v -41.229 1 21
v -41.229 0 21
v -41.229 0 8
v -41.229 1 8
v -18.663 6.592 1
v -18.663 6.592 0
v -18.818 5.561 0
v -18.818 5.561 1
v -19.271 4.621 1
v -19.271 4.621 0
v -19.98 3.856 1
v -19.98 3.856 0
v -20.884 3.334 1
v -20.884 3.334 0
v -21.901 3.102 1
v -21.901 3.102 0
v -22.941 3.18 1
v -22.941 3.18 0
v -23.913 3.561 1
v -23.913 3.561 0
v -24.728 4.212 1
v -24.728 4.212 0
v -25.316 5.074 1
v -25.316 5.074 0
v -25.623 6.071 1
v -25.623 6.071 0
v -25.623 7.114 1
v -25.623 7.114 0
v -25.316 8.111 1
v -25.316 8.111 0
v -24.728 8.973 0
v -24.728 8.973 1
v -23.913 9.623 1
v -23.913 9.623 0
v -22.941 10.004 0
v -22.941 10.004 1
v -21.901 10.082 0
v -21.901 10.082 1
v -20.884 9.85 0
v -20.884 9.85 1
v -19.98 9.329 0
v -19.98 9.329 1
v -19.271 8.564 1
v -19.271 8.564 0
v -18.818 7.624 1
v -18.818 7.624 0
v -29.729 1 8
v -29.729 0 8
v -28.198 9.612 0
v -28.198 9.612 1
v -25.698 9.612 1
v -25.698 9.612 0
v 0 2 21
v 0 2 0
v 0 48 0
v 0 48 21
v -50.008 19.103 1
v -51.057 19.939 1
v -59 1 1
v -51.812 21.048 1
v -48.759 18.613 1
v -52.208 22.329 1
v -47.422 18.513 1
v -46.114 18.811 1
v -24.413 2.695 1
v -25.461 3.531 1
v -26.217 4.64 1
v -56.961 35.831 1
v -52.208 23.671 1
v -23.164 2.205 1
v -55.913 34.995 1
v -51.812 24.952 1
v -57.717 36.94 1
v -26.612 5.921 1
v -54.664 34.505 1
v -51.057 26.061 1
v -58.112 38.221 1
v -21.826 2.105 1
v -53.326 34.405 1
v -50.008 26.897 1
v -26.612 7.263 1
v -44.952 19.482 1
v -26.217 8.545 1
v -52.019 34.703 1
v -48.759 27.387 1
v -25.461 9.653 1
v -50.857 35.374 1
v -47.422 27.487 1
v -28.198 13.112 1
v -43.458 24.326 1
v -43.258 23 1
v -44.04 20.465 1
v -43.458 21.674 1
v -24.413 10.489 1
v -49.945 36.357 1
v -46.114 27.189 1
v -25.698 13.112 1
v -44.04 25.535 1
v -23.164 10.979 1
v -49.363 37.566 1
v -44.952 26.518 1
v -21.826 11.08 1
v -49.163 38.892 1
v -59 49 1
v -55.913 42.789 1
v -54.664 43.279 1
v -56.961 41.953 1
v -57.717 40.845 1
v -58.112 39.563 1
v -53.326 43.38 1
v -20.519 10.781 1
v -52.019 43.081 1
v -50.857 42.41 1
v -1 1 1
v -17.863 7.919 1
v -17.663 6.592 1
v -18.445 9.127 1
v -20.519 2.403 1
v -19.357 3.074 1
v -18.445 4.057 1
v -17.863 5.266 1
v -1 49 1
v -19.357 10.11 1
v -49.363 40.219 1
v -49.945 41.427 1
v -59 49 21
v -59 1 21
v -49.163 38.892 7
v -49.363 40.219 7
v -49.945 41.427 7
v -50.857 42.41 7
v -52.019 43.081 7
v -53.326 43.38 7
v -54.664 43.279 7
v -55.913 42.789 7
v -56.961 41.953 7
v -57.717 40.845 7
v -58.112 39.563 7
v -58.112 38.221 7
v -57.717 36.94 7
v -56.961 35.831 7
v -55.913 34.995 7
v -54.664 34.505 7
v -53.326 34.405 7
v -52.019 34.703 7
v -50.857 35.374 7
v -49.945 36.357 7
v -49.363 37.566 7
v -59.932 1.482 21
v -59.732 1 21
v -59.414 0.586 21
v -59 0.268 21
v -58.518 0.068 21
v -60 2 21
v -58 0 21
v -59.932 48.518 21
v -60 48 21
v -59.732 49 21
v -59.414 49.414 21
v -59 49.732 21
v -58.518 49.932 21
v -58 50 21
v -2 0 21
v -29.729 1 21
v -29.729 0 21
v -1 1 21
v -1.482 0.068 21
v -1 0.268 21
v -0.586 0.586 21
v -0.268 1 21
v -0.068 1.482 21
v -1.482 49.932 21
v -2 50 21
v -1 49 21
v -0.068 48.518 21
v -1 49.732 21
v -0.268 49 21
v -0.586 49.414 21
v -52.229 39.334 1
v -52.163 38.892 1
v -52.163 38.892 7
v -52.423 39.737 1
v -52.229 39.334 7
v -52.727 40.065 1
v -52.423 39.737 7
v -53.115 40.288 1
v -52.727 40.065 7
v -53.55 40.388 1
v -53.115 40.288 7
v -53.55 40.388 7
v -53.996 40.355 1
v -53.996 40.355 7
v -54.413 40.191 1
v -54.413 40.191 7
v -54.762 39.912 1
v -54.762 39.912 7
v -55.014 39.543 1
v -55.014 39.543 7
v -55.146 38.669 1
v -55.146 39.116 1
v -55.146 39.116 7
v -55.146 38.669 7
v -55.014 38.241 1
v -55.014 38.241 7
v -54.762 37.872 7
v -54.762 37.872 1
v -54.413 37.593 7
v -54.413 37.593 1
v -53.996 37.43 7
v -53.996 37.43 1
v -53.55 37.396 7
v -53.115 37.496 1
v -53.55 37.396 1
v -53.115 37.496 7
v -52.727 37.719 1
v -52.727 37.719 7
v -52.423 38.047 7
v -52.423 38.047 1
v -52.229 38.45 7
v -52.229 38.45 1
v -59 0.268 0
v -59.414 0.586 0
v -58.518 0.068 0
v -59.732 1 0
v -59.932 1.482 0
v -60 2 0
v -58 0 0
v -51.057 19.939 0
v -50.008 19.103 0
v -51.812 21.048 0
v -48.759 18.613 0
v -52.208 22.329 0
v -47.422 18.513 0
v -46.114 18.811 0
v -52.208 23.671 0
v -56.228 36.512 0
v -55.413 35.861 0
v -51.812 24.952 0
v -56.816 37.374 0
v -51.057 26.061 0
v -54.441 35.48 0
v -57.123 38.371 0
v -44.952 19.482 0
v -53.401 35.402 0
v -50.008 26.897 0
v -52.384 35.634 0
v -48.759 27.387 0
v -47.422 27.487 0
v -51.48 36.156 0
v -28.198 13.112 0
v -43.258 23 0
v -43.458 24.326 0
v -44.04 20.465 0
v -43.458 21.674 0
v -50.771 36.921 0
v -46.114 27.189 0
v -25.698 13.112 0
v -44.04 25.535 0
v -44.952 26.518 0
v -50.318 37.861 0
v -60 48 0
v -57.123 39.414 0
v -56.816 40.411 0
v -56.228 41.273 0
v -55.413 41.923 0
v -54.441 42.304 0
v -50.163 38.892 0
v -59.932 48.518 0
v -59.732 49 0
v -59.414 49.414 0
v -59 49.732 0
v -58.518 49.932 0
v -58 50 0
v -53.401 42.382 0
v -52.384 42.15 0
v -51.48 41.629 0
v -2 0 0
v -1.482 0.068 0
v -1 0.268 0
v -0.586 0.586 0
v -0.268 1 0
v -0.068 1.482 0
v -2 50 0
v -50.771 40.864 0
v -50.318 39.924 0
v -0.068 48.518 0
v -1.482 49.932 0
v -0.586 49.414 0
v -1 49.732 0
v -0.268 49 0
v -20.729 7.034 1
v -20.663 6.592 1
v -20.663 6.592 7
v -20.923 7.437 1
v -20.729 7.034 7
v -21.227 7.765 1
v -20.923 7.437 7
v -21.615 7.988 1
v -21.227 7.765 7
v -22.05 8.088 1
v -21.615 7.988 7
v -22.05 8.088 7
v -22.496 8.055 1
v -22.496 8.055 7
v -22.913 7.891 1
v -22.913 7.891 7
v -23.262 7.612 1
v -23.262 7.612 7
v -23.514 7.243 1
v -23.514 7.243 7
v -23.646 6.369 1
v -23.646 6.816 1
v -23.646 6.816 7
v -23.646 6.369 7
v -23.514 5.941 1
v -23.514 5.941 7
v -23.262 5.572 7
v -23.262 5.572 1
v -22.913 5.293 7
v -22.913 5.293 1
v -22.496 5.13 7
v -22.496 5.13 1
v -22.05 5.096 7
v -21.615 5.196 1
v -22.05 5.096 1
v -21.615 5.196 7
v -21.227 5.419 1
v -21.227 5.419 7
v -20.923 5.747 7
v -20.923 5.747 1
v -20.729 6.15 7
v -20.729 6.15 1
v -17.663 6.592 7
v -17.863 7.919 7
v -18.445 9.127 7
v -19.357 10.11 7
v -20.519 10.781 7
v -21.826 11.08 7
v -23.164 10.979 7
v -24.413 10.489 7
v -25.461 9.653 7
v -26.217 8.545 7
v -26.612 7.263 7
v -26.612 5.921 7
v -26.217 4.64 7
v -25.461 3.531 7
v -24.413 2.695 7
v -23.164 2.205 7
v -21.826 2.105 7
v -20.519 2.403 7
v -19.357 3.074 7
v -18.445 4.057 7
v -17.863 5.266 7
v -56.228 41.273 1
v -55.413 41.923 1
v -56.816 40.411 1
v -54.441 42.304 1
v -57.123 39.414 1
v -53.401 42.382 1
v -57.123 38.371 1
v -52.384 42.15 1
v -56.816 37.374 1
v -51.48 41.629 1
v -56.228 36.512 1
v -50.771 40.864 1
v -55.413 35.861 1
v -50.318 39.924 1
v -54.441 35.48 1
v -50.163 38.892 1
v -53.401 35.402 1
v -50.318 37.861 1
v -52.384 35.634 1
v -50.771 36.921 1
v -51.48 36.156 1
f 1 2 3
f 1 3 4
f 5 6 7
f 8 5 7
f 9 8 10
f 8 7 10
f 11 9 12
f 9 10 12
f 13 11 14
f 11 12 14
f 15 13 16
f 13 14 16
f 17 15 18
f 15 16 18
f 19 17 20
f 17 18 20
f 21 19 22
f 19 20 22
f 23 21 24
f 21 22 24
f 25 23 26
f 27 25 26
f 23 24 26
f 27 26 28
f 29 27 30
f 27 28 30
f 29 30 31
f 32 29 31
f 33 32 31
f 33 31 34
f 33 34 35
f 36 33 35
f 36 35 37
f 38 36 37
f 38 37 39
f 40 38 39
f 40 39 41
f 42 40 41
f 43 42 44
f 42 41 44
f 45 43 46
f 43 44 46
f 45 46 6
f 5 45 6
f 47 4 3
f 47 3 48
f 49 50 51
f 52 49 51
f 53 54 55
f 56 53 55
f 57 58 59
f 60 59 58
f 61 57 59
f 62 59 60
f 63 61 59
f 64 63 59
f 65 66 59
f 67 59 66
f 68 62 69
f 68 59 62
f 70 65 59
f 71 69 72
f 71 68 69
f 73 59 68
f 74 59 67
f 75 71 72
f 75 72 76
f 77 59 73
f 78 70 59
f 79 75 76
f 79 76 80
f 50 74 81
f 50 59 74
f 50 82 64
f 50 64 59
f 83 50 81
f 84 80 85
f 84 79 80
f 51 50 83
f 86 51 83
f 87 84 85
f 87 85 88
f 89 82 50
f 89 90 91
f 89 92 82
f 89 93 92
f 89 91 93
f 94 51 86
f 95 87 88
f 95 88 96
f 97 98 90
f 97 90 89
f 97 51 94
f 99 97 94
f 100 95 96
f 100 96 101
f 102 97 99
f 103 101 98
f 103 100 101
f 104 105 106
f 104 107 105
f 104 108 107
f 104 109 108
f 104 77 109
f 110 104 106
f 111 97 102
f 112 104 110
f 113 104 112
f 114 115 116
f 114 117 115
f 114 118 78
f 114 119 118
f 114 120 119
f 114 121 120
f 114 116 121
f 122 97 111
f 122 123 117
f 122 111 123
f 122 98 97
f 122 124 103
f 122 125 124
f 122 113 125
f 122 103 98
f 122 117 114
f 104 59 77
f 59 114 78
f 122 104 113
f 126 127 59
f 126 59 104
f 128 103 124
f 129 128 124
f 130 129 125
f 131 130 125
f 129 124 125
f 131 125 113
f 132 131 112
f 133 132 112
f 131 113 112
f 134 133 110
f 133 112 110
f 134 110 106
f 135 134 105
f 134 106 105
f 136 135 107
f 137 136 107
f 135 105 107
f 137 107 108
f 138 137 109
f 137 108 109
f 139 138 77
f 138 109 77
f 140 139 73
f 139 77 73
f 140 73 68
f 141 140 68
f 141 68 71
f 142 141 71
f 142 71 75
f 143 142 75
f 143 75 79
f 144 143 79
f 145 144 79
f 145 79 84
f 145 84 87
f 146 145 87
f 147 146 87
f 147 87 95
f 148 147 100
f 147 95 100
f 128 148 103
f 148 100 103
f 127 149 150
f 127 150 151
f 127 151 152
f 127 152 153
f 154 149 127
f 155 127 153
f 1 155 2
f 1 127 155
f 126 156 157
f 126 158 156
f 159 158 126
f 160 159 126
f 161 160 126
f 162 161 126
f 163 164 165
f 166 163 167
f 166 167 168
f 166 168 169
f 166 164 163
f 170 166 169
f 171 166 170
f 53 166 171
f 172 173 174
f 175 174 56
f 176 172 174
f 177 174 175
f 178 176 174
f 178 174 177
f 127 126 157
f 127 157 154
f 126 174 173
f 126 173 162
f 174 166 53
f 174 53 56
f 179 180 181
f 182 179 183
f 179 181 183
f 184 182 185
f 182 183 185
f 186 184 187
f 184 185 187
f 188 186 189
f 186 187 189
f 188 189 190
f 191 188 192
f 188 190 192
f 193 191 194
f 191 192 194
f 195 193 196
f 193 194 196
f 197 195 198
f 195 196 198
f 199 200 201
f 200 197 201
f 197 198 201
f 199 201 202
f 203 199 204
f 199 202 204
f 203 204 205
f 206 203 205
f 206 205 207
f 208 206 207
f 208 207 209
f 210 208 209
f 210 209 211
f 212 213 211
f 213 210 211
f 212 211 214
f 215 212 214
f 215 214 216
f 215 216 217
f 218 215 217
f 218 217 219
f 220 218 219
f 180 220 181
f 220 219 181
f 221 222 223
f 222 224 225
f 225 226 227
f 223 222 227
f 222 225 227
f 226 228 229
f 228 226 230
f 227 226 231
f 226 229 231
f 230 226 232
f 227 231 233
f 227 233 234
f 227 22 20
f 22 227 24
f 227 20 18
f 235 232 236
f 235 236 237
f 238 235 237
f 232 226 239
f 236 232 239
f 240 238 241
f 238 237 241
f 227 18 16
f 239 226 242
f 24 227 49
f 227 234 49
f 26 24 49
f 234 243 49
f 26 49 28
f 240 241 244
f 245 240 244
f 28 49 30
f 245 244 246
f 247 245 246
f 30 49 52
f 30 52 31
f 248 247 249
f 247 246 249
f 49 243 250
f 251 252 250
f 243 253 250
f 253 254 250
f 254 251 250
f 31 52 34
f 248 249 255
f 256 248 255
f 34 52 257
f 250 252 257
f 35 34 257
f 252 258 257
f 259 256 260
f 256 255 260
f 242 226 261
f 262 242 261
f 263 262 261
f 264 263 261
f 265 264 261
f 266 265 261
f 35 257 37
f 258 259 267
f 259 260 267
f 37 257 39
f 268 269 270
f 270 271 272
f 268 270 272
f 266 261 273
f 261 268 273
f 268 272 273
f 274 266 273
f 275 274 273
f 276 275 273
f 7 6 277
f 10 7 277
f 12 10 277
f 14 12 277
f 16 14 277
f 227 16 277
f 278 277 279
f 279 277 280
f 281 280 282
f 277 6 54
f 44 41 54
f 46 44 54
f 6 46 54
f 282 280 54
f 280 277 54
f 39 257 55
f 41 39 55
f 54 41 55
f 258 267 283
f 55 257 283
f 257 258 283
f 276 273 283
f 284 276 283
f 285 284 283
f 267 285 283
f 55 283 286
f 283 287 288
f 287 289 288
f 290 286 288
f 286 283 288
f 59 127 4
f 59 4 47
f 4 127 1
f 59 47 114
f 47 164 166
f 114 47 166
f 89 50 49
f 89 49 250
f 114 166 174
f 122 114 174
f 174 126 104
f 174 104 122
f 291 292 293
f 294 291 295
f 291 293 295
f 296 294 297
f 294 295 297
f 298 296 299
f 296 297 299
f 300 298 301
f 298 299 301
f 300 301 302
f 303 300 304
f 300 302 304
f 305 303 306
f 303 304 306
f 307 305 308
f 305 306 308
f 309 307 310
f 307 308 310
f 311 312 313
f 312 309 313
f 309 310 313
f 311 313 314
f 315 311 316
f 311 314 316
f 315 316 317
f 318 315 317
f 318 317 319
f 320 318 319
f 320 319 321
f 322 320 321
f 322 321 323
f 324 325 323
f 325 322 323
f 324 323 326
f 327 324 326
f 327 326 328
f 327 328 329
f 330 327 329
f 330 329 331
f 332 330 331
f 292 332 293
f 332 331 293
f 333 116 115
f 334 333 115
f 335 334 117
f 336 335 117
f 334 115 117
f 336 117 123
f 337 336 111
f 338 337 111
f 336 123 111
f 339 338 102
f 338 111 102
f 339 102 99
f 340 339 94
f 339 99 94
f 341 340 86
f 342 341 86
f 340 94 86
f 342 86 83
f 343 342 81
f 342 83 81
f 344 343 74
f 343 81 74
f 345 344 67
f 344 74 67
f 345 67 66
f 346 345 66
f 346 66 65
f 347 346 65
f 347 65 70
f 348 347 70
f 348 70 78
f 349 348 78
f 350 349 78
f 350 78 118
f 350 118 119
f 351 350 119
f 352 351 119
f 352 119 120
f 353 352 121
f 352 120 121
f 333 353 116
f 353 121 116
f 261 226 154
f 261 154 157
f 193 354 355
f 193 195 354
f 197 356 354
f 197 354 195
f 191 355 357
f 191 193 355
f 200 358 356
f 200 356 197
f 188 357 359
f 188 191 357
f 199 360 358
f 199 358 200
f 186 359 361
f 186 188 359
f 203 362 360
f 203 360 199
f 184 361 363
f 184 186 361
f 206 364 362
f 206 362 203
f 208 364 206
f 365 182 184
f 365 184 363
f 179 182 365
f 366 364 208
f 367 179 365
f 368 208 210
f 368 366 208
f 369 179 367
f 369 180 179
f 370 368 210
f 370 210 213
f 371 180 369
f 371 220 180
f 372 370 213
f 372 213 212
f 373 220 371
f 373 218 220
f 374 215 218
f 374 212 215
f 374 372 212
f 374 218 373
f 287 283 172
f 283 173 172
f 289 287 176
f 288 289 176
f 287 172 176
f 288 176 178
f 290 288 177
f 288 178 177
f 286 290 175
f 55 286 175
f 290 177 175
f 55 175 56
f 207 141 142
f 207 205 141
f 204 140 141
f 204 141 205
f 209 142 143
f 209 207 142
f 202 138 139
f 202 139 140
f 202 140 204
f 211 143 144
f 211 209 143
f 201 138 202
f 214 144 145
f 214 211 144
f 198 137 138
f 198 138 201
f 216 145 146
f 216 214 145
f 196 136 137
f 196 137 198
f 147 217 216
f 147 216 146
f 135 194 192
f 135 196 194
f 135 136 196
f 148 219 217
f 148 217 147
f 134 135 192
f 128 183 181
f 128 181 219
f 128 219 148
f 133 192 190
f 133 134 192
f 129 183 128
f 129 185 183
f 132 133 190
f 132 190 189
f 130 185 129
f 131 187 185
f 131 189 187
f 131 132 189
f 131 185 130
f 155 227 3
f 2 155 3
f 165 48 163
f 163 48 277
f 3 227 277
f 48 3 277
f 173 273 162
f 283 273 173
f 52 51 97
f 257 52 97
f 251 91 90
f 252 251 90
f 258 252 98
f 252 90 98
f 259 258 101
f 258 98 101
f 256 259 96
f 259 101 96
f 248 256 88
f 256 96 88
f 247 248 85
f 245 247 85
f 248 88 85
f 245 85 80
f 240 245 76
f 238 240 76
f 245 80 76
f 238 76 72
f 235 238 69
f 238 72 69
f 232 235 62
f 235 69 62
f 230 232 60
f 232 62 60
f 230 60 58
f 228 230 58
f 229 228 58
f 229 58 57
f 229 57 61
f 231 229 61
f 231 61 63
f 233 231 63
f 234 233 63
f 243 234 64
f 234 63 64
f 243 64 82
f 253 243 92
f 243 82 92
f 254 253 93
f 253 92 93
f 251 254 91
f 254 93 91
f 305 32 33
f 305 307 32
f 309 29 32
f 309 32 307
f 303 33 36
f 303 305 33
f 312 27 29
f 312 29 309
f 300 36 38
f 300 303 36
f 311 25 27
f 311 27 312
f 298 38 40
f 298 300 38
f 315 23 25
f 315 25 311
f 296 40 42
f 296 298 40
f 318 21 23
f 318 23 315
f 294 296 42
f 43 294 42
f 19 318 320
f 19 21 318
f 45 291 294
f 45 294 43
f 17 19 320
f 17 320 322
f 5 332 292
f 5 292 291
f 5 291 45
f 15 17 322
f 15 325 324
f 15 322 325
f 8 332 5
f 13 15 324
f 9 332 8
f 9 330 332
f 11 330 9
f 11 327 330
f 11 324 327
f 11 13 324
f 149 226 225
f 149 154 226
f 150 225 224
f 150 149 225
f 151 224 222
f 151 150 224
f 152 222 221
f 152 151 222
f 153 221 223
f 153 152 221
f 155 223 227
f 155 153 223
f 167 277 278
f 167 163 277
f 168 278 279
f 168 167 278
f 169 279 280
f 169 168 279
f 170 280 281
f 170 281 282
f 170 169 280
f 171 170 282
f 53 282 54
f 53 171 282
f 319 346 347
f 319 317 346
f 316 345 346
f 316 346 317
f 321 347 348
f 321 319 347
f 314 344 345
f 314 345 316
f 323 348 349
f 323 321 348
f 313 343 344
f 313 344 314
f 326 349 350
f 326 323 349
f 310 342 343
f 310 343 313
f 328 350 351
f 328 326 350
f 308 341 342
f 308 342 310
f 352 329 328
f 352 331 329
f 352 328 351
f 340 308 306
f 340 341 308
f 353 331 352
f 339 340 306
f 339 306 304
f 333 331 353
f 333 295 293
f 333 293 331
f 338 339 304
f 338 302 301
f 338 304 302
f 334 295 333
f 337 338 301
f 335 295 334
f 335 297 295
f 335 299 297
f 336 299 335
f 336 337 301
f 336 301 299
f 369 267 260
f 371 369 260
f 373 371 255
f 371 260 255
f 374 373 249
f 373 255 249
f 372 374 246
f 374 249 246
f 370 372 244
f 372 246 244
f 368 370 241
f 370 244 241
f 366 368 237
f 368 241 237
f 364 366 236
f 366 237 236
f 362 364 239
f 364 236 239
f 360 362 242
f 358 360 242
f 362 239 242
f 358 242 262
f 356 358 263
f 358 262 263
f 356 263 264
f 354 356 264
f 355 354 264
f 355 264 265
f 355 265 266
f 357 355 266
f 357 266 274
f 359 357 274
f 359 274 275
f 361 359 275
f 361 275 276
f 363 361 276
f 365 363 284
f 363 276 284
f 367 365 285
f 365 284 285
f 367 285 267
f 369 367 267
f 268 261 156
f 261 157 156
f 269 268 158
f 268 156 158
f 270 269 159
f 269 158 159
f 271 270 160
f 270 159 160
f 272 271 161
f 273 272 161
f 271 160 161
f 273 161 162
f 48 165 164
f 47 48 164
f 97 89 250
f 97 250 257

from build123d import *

# Parameters (mm, degrees)
F0_W      = 60
F0_H      = 50
F1_DEPTH  = 21
F2_W      = 58
F2_H      = 48
F3_DEPTH  = 20
F5_R      = 2
F6_R      = 4.5
F7_DEPTH  = 6
F10_W     = 11.5
F10_H     = 1
F11_DEPTH = 13
F12_W     = 2.5
F12_H     = 3.5
F13_DEPTH = 1
F14_R     = 4.5
F15_DEPTH = 1
F8_R      = 1.5
F16_DEPTH = 7
F9_R      = 1.5
F17_DEPTH = 7
F18_R     = 3.5
F18_R_2   = 1.5
F19_DEPTH = 1


with BuildPart() as f1:
    # F0 (on Top) → F1 (new body)
    with BuildSketch(Plane.XY):
        with Locations((-30, 25)):
            Rectangle(F0_W, F0_H)
    extrude(amount=F1_DEPTH)

    # F2 (on face) → F3 (cut)
    with BuildSketch(Plane.XY.offset(21)):
        with Locations((-30, 25)):
            Rectangle(F2_W, F2_H)
    extrude(amount=-F3_DEPTH, mode=Mode.SUBTRACT)

    # F5
    f5_edges = [f1.edges().sort_by_distance(p)[0] for p in [
        (-60, 50, 10.5),
        (0, 50, 10.5),
        (0, 0, 10.5),
        (-60, 0, 10.5),
    ]]
    fillet(f5_edges, radius=F5_R)

    # F6 (on face) → F7 (join)
    with BuildSketch(Plane.XY.offset(1)):
        with Locations((-22.1625890434, 6.5921834528)):
            Circle(F6_R)
        with Locations((-53.6625890434, 38.8921834528)):
            Circle(F6_R)
    extrude(amount=F7_DEPTH)

    # F10 (on face) → F11 (cut)
    with BuildSketch(Plane.XY.offset(21)):
        with Locations((-35.4789009094, 0.5)):
            Rectangle(F10_W, F10_H)
    extrude(amount=-F11_DEPTH, mode=Mode.SUBTRACT)

    # F12 (on face) → F13 (cut)
    with BuildSketch(Plane.XY.offset(1)):
        with Locations((-26.94821703, 11.3616460413)):
            Rectangle(F12_W, F12_H)
    extrude(amount=-F13_DEPTH, mode=Mode.SUBTRACT)

    # F14 (on face) → F15 (cut)
    with BuildSketch(Plane.XY.offset(1)):
        with Locations((-47.7578996122, 23)):
            Circle(F14_R)
    extrude(amount=-F15_DEPTH, mode=Mode.SUBTRACT)

    # F8 (on face) → F16 (cut)
    with BuildSketch(Plane.XY.offset(7)):
        with Locations((-53.6625890434, 38.8921834528)):
            Circle(F8_R)
    extrude(amount=-F16_DEPTH, mode=Mode.SUBTRACT)

    # F9 (on face) → F17 (cut)
    with BuildSketch(Plane.XY.offset(7)):
        with Locations((-22.1625890434, 6.5921834528)):
            Circle(F9_R)
    extrude(amount=-F17_DEPTH, mode=Mode.SUBTRACT)

    # F18 (on face) → F19 (cut)
    with BuildSketch(Plane(origin=(0, 0, 0), x_dir=(1, 0, 0), z_dir=(0, 0, -1))):
        with Locations((-22.1625890434, -6.5921834528)):
            Circle(F18_R)
        with Locations((-22.1625890434, -6.5921834528)):
            Circle(F18_R_2, mode=Mode.SUBTRACT)
        with Locations((-53.6625890434, -38.8921834528)):
            Circle(F18_R)
        with Locations((-53.6625890434, -38.8921834528)):
            Circle(F18_R_2, mode=Mode.SUBTRACT)
    extrude(amount=-F19_DEPTH, mode=Mode.SUBTRACT)


solid = f1.part
